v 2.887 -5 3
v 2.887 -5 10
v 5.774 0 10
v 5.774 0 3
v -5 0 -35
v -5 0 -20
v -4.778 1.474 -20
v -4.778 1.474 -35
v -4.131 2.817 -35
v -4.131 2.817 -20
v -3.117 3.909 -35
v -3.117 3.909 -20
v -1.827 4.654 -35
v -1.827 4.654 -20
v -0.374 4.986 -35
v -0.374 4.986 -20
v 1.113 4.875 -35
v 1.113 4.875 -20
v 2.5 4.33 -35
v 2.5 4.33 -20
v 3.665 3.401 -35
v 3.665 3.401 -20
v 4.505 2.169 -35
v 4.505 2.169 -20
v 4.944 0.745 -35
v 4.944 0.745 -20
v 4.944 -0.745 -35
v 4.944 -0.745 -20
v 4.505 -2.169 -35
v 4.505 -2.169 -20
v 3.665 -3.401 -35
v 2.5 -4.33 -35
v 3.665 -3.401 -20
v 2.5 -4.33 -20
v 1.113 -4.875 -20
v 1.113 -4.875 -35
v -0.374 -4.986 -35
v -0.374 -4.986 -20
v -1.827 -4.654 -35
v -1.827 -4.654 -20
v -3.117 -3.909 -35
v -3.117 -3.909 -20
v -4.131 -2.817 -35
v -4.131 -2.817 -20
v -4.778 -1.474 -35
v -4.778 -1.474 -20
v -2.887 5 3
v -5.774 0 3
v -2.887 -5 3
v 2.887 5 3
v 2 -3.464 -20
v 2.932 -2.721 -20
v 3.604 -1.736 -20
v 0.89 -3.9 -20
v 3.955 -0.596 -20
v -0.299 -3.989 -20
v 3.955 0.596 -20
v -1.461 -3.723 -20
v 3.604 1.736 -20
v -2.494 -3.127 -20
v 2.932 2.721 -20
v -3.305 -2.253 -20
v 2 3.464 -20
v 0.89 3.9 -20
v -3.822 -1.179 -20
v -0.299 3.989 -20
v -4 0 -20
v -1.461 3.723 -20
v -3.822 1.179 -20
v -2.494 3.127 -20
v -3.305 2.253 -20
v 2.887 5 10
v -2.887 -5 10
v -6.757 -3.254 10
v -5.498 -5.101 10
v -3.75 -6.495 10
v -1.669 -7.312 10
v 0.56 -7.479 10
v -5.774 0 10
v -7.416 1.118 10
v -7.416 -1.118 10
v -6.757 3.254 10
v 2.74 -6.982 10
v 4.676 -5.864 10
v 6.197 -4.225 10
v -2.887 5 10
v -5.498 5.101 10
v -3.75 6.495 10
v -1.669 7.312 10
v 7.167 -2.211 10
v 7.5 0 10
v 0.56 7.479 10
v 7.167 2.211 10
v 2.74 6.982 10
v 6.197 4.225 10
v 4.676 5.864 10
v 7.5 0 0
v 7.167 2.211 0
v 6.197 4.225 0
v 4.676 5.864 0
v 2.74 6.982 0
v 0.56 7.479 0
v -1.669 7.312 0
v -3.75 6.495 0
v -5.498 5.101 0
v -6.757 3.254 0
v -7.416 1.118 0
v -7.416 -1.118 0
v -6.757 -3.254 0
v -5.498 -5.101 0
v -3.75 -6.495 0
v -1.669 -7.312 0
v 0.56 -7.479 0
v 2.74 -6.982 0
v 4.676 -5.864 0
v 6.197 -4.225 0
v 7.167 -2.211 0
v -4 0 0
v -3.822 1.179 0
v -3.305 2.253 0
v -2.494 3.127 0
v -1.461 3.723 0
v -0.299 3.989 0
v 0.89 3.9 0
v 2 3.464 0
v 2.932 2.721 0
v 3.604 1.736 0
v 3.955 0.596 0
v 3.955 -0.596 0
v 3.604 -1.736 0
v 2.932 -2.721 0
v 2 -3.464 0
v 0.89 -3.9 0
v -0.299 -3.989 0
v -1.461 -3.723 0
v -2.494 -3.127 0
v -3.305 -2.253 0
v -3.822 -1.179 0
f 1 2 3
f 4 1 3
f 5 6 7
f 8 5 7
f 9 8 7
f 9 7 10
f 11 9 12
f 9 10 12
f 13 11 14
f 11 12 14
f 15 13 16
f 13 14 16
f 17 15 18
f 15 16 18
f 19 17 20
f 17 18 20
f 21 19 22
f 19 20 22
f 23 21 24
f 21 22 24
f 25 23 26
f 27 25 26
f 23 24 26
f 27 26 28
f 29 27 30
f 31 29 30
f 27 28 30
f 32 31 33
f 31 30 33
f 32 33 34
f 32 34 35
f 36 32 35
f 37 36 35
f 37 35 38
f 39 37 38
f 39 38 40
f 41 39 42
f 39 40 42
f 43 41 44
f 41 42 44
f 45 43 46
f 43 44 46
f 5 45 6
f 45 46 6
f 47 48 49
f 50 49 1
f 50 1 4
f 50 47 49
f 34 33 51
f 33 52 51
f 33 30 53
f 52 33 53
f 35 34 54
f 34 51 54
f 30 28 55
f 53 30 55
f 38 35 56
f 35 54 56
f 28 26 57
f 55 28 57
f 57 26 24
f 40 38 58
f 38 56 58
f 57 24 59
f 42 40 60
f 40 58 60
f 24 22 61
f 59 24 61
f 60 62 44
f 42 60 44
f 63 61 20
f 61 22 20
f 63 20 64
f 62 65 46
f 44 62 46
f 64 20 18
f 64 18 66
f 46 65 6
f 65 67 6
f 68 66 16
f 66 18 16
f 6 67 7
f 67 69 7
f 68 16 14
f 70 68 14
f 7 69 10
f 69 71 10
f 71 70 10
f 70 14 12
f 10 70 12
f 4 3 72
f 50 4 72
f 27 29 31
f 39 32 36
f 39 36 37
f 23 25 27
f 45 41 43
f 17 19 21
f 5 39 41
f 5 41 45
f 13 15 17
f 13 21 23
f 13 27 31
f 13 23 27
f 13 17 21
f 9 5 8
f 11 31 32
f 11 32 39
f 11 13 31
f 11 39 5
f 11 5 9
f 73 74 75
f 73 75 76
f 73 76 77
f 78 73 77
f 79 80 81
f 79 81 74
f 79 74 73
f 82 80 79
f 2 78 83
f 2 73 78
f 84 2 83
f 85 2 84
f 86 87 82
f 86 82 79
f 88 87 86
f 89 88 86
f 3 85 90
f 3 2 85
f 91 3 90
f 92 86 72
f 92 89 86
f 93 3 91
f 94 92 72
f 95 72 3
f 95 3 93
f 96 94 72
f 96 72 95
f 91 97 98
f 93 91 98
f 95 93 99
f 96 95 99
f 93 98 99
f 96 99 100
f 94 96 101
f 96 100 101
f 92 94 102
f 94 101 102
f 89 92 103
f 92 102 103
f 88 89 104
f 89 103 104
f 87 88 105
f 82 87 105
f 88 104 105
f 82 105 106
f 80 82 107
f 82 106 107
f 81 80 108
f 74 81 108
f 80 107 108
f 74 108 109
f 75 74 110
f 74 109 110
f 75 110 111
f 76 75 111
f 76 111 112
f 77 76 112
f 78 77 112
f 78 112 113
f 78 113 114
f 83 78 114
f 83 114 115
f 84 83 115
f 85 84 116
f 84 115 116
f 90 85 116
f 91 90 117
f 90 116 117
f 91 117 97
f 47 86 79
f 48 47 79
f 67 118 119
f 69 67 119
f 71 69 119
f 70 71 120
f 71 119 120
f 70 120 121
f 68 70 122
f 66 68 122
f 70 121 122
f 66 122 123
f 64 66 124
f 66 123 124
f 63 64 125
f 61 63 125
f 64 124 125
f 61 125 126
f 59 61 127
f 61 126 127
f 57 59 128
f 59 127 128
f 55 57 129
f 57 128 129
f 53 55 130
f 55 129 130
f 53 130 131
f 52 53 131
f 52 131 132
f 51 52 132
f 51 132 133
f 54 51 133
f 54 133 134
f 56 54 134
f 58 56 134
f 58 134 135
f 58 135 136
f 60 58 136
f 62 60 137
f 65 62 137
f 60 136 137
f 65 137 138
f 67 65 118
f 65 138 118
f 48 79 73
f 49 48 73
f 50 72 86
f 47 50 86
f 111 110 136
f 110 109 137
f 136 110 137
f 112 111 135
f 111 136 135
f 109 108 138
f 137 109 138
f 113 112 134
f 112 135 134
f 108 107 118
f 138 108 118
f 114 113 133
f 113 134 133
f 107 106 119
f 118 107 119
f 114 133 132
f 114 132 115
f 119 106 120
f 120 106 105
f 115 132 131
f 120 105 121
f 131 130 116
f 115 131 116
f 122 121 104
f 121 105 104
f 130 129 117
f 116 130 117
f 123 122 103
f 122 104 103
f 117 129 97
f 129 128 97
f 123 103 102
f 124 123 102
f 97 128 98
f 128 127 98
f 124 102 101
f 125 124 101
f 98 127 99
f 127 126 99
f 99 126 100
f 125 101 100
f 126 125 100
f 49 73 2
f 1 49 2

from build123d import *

# Parameters (mm, degrees)
SKETCH1_R           = 7.5
BOSS_EXTRUDE1_DEPTH = 10
SKETCH2_R           = 4
BOSS_EXTRUDE2_DEPTH = 20
SKETCH3_R           = 5
BOSS_EXTRUDE3_DEPTH = 15
CUT_EXTRUDE1_DEPTH  = 7


with BuildPart() as part:
    # Sketch1 → Boss-Extrude1 (new body)
    with BuildSketch(Plane.XY):
        Circle(SKETCH1_R)
    extrude(amount=BOSS_EXTRUDE1_DEPTH)

    # Sketch2 → Boss-Extrude2 (add)
    with BuildSketch(Plane(origin=(0, 0, 0), x_dir=(-1, 0, 0), z_dir=(0, 0, -1))):
        Circle(SKETCH2_R)
    extrude(amount=BOSS_EXTRUDE2_DEPTH)

    # Sketch3 → Boss-Extrude3 (add)
    with BuildSketch(Plane(origin=(0, 0, -20), x_dir=(-1, 0, 0), z_dir=(0, 0, -1))):
        Circle(SKETCH3_R)
    extrude(amount=BOSS_EXTRUDE3_DEPTH)

    # Sketch4 → Cut-Extrude1 (cut)
    with BuildSketch(Plane.XY.offset(10)):
        Polygon((2.886751346, 5), (-2.886751346, 5), (-5.773502692, 0), (-2.886751346, -5), (2.886751346, -5), (5.773502692, 0), align=None)
    extrude(amount=-CUT_EXTRUDE1_DEPTH, mode=Mode.SUBTRACT)


solid = part.part
